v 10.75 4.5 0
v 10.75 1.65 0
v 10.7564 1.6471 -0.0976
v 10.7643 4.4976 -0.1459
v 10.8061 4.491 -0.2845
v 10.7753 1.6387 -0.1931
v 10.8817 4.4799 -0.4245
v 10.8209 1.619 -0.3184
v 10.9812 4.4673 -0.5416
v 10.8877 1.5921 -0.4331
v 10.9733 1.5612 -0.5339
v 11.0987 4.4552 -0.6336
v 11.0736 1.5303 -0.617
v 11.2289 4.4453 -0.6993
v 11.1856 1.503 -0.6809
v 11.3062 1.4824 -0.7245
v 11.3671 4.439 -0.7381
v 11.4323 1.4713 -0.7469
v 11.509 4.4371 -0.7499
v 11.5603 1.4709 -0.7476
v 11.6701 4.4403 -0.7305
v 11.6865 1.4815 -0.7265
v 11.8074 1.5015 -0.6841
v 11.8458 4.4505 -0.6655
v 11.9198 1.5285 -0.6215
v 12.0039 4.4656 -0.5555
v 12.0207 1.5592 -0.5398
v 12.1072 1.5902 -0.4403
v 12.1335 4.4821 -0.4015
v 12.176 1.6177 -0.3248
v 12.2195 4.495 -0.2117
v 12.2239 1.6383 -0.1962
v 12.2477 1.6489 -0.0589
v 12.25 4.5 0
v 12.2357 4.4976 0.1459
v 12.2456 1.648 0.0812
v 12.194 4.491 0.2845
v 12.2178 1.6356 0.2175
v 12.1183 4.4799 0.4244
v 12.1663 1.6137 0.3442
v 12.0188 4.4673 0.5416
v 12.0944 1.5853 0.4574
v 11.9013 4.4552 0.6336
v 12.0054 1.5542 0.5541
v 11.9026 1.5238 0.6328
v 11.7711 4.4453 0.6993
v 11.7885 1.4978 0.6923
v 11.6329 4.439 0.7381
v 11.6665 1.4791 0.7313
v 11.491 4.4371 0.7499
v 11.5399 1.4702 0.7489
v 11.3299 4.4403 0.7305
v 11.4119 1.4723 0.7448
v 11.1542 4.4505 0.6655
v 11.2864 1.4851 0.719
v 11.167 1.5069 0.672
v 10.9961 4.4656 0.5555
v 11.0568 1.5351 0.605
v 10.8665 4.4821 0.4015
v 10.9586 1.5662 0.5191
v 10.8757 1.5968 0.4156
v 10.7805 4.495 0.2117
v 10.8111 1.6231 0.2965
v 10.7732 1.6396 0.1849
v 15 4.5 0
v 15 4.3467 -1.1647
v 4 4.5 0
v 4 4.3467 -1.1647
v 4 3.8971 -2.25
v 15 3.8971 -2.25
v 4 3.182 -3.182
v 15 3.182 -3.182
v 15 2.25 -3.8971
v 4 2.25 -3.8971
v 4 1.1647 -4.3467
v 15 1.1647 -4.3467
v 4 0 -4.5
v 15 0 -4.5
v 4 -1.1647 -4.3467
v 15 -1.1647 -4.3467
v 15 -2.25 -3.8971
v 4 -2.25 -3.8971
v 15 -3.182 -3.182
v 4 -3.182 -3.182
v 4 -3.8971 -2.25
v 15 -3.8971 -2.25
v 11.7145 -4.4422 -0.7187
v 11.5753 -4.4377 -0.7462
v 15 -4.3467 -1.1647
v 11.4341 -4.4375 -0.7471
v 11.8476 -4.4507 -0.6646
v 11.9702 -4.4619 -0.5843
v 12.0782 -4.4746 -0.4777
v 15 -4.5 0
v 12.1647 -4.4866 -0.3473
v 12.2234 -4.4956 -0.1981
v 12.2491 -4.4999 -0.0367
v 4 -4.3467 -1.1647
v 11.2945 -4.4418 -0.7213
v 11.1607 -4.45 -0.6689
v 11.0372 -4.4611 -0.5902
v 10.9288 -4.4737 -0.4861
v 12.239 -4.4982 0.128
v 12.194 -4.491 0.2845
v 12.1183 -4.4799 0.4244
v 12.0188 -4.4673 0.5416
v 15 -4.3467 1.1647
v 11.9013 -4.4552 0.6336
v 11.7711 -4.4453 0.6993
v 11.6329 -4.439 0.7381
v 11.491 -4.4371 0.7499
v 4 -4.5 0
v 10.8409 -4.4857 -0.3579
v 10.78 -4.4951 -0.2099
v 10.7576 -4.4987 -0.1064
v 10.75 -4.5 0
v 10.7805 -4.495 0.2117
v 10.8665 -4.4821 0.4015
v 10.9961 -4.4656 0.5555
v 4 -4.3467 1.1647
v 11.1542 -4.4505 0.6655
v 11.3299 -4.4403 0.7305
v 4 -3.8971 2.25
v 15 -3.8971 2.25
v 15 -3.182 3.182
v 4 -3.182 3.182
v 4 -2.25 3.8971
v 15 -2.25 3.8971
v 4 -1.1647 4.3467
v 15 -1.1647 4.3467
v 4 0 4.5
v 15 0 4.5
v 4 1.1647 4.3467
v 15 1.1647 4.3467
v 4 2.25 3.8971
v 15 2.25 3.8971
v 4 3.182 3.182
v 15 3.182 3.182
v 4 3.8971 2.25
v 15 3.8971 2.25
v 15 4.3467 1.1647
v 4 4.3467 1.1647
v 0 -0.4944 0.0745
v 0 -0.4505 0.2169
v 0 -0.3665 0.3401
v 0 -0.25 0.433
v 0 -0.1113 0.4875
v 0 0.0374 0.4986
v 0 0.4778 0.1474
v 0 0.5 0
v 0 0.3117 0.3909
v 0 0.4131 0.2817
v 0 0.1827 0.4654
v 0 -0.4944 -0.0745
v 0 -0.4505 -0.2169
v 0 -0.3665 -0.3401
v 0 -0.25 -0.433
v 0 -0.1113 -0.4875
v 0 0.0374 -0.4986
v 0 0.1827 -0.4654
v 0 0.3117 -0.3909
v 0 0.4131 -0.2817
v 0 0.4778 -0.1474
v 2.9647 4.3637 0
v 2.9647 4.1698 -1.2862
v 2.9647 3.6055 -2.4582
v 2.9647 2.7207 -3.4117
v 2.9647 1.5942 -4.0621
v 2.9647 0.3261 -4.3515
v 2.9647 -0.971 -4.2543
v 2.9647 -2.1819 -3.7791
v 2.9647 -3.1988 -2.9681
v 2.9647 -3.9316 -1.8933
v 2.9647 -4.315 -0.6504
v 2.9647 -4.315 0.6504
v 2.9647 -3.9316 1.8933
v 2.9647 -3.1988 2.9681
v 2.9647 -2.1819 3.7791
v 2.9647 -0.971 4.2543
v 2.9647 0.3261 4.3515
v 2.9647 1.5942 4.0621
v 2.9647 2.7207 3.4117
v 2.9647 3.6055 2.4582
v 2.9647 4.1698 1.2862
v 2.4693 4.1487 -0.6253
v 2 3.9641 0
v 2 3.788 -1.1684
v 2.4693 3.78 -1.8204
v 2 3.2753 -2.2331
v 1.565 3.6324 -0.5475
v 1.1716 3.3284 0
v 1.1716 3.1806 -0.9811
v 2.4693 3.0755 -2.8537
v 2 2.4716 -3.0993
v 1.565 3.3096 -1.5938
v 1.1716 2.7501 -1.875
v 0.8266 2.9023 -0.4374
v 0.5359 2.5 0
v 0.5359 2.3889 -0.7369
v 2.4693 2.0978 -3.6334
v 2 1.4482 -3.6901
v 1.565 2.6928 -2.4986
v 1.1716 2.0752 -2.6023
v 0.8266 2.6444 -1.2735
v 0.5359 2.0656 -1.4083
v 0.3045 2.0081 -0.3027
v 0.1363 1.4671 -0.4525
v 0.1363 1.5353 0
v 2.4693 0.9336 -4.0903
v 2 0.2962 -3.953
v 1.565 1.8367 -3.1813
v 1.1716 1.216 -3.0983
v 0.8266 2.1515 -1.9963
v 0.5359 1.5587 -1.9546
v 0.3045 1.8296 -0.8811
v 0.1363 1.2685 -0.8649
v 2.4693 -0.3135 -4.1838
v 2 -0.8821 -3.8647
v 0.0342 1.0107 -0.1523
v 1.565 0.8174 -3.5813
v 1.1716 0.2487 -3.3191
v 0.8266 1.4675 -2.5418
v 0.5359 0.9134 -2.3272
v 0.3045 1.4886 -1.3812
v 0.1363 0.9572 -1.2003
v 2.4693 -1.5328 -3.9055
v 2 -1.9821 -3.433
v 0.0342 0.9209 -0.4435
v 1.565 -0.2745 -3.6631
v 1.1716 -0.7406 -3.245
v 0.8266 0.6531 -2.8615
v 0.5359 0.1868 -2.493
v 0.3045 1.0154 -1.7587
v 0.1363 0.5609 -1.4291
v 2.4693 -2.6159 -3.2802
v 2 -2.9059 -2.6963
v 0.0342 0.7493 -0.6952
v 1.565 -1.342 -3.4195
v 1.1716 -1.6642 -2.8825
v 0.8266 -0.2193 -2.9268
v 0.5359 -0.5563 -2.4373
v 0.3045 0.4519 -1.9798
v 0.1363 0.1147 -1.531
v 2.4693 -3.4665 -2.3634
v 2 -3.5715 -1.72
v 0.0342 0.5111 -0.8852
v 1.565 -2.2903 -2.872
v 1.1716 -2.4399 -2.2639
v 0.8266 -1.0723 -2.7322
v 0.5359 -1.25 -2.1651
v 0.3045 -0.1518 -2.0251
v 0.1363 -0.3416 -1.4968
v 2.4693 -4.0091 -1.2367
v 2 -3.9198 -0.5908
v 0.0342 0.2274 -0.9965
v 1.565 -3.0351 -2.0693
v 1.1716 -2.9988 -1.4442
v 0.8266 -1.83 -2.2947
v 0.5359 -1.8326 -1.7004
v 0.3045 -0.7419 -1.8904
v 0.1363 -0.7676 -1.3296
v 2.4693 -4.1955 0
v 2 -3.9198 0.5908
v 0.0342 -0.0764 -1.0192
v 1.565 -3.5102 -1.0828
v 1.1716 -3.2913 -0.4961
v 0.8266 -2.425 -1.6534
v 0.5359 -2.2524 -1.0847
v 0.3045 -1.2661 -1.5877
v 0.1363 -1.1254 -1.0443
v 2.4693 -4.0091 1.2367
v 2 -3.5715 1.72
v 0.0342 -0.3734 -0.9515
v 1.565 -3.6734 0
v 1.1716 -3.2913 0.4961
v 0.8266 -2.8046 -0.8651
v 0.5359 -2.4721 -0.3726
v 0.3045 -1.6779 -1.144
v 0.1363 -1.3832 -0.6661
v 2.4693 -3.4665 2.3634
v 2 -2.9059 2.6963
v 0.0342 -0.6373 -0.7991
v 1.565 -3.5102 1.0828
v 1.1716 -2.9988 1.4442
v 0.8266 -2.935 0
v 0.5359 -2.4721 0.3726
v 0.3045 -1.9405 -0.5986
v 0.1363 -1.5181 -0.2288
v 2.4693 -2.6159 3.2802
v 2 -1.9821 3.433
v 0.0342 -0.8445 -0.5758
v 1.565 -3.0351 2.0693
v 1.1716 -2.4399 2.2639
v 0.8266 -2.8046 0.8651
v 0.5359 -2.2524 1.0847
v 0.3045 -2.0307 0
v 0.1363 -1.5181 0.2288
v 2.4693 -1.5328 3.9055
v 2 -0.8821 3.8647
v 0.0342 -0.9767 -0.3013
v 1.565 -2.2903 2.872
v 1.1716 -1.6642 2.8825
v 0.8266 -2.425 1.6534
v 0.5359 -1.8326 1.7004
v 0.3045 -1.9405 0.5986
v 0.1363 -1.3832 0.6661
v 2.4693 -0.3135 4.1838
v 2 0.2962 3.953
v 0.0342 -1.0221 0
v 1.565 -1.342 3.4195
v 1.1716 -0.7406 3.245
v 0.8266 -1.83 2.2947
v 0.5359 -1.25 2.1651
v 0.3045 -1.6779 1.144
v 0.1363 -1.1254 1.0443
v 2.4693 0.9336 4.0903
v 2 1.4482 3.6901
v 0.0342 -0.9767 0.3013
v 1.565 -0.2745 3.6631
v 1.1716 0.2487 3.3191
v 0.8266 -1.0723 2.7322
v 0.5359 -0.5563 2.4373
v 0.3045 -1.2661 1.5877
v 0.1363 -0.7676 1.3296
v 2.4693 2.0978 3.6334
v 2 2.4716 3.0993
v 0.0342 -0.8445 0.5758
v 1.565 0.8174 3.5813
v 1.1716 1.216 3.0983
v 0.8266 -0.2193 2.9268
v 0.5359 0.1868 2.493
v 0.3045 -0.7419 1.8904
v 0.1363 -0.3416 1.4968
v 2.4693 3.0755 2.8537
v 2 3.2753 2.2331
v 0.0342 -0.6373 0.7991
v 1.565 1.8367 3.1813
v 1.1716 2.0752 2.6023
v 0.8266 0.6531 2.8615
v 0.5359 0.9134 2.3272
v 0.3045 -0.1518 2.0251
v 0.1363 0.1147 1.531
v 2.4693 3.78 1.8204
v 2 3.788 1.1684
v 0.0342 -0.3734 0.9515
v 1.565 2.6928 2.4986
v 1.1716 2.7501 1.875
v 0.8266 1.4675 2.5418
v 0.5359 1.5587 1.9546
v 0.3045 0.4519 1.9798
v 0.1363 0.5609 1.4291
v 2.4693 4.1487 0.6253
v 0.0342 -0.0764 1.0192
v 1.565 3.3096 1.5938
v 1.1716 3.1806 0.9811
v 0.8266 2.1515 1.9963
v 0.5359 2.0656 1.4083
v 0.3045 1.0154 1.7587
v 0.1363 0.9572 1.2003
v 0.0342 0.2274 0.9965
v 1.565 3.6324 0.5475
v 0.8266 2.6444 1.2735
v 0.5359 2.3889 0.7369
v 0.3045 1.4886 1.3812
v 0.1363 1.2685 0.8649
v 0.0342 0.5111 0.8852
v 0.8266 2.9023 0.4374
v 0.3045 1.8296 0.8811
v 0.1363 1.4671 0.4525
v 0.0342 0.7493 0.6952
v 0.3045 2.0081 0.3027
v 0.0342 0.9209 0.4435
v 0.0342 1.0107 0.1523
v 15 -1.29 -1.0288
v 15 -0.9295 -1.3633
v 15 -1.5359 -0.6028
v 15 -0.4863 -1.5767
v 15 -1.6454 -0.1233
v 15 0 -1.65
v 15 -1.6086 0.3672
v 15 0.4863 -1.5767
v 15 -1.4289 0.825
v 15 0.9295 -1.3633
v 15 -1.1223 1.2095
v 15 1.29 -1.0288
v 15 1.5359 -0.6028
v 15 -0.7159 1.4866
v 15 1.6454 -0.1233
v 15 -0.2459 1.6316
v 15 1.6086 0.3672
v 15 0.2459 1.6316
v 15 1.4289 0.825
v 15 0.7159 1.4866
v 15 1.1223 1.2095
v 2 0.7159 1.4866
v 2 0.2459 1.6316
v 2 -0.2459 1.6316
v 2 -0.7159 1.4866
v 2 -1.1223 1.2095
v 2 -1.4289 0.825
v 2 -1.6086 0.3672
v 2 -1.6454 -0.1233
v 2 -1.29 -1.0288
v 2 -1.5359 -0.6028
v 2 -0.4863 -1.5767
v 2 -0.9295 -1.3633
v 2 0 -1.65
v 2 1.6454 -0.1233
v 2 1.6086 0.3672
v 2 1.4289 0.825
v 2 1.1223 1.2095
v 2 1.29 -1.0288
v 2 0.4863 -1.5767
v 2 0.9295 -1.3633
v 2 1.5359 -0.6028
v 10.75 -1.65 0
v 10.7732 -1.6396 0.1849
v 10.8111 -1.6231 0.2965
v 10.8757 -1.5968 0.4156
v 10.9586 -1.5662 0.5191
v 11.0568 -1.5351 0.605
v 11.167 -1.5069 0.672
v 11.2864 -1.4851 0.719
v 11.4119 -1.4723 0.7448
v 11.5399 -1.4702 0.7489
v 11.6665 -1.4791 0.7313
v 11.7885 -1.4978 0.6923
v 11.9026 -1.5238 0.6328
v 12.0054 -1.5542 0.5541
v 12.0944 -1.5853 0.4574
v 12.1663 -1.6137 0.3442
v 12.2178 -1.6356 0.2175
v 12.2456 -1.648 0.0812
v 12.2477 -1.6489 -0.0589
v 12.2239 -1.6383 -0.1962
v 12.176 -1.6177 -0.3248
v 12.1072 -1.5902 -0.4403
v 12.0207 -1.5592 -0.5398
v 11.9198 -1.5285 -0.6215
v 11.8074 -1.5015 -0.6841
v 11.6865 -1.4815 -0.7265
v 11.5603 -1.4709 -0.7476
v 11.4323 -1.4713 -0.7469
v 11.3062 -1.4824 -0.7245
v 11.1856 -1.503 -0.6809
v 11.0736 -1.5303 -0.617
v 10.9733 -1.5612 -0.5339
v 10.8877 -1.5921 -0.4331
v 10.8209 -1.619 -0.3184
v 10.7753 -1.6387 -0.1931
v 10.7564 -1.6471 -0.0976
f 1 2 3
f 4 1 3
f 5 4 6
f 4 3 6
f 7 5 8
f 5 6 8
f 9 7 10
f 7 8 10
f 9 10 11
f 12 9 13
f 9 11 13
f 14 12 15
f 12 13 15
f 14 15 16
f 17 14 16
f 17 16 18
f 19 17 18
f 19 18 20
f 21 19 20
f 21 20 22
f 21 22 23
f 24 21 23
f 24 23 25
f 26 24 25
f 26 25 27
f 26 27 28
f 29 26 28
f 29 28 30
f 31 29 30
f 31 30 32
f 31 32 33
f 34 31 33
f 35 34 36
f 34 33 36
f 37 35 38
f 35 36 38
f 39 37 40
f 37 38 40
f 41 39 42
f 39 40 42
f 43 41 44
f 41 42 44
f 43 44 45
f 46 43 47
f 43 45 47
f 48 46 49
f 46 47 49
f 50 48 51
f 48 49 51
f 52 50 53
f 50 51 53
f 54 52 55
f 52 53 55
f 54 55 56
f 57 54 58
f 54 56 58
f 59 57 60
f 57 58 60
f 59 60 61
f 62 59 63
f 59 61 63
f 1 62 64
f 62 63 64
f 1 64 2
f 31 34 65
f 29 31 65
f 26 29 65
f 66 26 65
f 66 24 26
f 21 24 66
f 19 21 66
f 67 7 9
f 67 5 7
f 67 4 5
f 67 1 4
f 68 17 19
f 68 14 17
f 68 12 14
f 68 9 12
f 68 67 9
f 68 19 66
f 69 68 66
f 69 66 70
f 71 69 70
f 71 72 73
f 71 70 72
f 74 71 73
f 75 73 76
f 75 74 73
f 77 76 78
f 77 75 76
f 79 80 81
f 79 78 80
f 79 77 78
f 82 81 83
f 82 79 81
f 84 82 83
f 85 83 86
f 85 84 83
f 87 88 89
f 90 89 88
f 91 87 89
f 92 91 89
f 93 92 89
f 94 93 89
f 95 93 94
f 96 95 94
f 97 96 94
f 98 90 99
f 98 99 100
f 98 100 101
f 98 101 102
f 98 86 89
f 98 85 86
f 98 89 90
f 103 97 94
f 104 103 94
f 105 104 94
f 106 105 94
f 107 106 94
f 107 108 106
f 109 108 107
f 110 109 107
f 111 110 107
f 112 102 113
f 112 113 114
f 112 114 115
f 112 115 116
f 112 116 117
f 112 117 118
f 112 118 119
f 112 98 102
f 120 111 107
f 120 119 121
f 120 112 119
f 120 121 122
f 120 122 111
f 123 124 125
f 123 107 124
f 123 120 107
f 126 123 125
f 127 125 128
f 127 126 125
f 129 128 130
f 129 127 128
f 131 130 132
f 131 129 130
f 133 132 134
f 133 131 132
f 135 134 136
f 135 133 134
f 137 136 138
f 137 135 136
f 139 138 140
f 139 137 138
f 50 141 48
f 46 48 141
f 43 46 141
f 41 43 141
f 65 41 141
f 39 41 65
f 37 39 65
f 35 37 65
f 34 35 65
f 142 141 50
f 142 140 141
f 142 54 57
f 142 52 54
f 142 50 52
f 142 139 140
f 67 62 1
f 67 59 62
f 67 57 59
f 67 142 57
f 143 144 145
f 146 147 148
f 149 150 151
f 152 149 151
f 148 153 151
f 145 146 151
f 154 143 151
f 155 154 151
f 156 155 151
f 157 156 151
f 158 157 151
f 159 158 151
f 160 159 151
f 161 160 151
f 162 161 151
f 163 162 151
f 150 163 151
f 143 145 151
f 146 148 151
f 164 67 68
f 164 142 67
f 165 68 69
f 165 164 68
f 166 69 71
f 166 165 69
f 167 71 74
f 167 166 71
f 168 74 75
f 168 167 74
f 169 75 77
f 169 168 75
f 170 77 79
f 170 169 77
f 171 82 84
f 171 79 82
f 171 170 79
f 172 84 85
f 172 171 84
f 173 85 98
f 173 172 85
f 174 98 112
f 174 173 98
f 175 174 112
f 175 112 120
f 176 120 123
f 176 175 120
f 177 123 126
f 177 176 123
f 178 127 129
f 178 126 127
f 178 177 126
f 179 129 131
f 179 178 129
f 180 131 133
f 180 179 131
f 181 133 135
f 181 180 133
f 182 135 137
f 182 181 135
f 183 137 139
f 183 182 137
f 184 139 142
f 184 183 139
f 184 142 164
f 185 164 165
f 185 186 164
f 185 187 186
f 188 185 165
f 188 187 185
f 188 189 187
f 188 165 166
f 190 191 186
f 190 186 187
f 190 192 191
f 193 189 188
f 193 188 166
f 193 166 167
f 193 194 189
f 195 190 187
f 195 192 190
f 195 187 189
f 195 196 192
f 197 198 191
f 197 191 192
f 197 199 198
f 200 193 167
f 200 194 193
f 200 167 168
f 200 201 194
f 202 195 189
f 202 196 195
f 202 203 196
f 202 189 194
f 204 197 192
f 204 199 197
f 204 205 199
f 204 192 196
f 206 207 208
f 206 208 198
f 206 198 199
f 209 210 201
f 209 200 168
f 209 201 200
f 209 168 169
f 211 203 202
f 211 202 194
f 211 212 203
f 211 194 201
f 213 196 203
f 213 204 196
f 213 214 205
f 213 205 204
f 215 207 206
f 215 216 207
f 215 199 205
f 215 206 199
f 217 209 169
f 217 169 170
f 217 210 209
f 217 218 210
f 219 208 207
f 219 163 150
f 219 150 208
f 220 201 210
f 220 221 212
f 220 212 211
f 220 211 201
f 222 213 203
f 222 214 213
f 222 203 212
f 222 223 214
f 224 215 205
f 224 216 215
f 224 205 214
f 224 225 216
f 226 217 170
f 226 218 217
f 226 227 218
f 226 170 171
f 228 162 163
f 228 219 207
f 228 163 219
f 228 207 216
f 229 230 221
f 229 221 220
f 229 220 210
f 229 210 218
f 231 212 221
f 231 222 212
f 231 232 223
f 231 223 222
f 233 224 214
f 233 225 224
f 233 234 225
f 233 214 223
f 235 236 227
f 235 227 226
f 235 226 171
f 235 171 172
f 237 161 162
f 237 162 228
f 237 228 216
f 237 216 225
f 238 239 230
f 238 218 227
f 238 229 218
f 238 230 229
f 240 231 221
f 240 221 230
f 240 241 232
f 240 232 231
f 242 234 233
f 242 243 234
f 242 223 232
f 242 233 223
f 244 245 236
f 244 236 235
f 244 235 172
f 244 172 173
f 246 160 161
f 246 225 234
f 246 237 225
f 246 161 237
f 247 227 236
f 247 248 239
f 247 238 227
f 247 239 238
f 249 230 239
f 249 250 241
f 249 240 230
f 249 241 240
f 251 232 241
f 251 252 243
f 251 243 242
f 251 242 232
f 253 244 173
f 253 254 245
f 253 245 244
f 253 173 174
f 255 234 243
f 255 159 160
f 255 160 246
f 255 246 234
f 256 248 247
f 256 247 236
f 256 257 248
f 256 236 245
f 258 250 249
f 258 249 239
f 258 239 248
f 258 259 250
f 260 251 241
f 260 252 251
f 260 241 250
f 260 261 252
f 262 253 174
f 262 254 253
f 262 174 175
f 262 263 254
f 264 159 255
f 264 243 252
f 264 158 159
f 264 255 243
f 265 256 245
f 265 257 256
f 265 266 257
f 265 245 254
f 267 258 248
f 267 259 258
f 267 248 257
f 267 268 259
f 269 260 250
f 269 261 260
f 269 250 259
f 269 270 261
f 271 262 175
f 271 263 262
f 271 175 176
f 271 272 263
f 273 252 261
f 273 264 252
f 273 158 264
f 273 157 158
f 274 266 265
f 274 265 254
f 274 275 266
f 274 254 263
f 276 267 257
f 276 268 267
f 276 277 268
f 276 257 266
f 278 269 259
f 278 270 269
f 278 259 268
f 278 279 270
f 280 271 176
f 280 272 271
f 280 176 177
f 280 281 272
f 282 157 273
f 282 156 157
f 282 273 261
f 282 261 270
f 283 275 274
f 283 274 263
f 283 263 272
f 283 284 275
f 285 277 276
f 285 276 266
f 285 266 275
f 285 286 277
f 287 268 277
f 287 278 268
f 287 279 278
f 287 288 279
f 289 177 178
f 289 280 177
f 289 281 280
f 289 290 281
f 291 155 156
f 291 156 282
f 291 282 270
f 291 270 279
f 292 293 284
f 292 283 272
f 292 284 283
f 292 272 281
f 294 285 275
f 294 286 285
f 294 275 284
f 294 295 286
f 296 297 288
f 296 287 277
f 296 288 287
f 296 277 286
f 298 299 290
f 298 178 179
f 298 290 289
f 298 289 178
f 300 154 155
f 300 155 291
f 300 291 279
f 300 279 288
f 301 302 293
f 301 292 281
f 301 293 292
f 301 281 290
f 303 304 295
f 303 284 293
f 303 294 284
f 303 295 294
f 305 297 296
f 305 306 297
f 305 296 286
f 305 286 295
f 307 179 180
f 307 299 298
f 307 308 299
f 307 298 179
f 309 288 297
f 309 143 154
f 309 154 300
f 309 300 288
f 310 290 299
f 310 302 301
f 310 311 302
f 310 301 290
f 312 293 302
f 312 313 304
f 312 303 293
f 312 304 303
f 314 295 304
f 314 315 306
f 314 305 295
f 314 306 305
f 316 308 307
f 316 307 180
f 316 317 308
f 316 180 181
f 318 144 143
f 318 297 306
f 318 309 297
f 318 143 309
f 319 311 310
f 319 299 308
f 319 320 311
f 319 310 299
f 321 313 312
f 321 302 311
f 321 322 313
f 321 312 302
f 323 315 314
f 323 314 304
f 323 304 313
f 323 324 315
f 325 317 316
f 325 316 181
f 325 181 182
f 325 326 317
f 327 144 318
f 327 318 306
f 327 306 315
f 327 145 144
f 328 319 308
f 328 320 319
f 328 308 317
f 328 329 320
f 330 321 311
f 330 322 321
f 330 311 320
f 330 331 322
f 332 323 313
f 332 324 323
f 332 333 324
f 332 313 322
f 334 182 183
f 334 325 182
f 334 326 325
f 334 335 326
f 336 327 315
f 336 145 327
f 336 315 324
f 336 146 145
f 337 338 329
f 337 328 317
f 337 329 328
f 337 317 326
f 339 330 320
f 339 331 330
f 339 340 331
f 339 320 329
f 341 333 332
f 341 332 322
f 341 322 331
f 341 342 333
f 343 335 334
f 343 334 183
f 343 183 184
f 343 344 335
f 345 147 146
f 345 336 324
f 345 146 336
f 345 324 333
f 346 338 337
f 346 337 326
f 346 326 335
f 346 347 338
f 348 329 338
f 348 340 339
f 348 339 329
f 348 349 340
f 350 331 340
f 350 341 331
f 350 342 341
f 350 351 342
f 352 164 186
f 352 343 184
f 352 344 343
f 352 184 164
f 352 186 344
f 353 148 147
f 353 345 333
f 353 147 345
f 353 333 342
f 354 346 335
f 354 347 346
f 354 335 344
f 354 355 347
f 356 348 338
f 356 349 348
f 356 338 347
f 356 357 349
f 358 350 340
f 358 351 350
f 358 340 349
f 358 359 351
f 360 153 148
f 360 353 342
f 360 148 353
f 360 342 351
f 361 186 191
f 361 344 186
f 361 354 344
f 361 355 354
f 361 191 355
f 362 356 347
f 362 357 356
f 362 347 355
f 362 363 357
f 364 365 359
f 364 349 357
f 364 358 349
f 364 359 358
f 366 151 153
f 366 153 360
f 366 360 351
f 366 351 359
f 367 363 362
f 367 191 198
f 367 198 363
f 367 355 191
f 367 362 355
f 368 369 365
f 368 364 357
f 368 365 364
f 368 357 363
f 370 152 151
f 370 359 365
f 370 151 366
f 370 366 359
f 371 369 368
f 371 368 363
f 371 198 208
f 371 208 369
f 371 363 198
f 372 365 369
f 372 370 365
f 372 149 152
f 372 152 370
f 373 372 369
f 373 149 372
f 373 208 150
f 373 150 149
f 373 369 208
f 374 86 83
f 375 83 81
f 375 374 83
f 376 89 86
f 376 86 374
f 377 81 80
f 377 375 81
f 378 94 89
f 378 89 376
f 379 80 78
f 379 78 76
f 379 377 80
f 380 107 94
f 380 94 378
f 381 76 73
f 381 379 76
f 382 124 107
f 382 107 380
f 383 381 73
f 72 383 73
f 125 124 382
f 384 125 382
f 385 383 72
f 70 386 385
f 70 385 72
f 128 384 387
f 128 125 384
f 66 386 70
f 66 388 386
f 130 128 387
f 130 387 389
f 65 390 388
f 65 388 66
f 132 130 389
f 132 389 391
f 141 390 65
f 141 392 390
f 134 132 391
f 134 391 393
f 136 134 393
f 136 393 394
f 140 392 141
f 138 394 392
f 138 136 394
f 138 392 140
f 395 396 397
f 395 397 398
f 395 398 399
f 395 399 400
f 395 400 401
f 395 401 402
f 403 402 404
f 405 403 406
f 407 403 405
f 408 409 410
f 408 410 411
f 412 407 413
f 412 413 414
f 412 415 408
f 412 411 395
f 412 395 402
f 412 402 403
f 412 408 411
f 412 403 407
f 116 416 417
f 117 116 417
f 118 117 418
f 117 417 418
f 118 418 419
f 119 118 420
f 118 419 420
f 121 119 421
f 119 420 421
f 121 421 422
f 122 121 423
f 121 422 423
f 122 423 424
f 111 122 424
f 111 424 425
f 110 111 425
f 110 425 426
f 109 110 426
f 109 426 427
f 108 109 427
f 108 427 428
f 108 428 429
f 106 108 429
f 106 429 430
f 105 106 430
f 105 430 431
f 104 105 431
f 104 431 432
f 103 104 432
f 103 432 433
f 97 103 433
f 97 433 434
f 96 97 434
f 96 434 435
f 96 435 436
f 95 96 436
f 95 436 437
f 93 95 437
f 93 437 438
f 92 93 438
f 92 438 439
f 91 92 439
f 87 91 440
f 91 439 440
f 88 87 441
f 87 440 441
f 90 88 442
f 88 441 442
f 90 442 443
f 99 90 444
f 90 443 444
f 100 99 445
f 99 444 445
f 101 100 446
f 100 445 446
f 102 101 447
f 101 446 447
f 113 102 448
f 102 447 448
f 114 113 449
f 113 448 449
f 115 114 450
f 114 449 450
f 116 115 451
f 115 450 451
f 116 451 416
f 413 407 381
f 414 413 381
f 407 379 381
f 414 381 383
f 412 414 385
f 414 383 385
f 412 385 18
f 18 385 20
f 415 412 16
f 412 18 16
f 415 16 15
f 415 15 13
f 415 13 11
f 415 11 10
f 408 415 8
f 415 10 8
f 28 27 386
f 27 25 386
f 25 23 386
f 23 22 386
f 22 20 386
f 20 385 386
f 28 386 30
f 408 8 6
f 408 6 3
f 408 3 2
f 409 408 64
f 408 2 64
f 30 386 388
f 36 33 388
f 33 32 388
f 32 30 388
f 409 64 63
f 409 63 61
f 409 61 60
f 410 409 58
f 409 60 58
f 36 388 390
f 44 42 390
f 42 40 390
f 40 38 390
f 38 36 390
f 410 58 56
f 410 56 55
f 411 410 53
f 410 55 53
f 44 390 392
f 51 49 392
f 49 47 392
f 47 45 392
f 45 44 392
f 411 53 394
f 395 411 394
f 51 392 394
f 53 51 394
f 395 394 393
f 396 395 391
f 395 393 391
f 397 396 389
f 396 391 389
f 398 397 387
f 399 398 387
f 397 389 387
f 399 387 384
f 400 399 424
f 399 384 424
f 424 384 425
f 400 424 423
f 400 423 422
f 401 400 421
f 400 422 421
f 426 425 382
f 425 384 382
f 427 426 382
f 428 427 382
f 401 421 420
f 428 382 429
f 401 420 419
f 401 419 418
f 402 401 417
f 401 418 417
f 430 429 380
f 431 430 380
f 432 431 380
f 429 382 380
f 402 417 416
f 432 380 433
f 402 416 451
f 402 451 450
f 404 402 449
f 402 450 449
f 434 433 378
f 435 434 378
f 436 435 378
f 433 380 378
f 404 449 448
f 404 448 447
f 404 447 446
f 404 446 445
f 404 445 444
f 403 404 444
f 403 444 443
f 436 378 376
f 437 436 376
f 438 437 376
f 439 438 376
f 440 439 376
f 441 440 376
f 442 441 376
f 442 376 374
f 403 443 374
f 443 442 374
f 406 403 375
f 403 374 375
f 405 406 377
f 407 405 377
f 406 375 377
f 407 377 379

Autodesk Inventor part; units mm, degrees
ref_plane "YZ Plane" through (0, 0, 0) normal (1, 0, 0) x (0, 1, 0)
ref_plane "XZ Plane" through (0, 0, 0) normal (0, 1, 0) x (-1, 0, 0)
ref_plane "XY Plane" through (0, 0, 0) normal (0, 0, 1) x (1, 0, 0)
sketch "スケッチ1" plane through (0, 0, 0) normal (1, 0, 0) x (0, 1, 0)
  circle A0 centre (0, 0) radius 4.5
  dimension "d0" = 9
extrude "押し出し1" add sketch "スケッチ1" along normal blind 15
sketch "スケッチ2" plane through (15, 0, 0) normal (1, 0, 0) x (0, 0, -1)
  circle A0 centre (0, 0) radius 4.5 projected
  circle A1 centre (0, 0) radius 1.65
  dimension "d3" = 3.3
extrude "押し出し2" cut sketch "スケッチ2" against normal blind 13 contours A1
fillet "フィレット1" radius 4 1 edges at (0, -4.5, 0)
sketch "スケッチ3" plane through (0, 0, 0) normal (0, 1, 0) x (-1, 0, 0)
  circle A0 centre (-11.5, 0) radius 0.75
  line L0 (-15, 4.5) -> (-15, -4.5) projected
  point P0 (0, 0)
  point P1 (-5, -5)
  point P2 (-5, 5)
  dimension "d7" = 1.5
  dimension "d8" = 3.5
  dimension "d9" = 0
extrude "押し出し3" cut sketch "スケッチ3" along normal mid plane 13
properties part number "motor-stick-cap"
